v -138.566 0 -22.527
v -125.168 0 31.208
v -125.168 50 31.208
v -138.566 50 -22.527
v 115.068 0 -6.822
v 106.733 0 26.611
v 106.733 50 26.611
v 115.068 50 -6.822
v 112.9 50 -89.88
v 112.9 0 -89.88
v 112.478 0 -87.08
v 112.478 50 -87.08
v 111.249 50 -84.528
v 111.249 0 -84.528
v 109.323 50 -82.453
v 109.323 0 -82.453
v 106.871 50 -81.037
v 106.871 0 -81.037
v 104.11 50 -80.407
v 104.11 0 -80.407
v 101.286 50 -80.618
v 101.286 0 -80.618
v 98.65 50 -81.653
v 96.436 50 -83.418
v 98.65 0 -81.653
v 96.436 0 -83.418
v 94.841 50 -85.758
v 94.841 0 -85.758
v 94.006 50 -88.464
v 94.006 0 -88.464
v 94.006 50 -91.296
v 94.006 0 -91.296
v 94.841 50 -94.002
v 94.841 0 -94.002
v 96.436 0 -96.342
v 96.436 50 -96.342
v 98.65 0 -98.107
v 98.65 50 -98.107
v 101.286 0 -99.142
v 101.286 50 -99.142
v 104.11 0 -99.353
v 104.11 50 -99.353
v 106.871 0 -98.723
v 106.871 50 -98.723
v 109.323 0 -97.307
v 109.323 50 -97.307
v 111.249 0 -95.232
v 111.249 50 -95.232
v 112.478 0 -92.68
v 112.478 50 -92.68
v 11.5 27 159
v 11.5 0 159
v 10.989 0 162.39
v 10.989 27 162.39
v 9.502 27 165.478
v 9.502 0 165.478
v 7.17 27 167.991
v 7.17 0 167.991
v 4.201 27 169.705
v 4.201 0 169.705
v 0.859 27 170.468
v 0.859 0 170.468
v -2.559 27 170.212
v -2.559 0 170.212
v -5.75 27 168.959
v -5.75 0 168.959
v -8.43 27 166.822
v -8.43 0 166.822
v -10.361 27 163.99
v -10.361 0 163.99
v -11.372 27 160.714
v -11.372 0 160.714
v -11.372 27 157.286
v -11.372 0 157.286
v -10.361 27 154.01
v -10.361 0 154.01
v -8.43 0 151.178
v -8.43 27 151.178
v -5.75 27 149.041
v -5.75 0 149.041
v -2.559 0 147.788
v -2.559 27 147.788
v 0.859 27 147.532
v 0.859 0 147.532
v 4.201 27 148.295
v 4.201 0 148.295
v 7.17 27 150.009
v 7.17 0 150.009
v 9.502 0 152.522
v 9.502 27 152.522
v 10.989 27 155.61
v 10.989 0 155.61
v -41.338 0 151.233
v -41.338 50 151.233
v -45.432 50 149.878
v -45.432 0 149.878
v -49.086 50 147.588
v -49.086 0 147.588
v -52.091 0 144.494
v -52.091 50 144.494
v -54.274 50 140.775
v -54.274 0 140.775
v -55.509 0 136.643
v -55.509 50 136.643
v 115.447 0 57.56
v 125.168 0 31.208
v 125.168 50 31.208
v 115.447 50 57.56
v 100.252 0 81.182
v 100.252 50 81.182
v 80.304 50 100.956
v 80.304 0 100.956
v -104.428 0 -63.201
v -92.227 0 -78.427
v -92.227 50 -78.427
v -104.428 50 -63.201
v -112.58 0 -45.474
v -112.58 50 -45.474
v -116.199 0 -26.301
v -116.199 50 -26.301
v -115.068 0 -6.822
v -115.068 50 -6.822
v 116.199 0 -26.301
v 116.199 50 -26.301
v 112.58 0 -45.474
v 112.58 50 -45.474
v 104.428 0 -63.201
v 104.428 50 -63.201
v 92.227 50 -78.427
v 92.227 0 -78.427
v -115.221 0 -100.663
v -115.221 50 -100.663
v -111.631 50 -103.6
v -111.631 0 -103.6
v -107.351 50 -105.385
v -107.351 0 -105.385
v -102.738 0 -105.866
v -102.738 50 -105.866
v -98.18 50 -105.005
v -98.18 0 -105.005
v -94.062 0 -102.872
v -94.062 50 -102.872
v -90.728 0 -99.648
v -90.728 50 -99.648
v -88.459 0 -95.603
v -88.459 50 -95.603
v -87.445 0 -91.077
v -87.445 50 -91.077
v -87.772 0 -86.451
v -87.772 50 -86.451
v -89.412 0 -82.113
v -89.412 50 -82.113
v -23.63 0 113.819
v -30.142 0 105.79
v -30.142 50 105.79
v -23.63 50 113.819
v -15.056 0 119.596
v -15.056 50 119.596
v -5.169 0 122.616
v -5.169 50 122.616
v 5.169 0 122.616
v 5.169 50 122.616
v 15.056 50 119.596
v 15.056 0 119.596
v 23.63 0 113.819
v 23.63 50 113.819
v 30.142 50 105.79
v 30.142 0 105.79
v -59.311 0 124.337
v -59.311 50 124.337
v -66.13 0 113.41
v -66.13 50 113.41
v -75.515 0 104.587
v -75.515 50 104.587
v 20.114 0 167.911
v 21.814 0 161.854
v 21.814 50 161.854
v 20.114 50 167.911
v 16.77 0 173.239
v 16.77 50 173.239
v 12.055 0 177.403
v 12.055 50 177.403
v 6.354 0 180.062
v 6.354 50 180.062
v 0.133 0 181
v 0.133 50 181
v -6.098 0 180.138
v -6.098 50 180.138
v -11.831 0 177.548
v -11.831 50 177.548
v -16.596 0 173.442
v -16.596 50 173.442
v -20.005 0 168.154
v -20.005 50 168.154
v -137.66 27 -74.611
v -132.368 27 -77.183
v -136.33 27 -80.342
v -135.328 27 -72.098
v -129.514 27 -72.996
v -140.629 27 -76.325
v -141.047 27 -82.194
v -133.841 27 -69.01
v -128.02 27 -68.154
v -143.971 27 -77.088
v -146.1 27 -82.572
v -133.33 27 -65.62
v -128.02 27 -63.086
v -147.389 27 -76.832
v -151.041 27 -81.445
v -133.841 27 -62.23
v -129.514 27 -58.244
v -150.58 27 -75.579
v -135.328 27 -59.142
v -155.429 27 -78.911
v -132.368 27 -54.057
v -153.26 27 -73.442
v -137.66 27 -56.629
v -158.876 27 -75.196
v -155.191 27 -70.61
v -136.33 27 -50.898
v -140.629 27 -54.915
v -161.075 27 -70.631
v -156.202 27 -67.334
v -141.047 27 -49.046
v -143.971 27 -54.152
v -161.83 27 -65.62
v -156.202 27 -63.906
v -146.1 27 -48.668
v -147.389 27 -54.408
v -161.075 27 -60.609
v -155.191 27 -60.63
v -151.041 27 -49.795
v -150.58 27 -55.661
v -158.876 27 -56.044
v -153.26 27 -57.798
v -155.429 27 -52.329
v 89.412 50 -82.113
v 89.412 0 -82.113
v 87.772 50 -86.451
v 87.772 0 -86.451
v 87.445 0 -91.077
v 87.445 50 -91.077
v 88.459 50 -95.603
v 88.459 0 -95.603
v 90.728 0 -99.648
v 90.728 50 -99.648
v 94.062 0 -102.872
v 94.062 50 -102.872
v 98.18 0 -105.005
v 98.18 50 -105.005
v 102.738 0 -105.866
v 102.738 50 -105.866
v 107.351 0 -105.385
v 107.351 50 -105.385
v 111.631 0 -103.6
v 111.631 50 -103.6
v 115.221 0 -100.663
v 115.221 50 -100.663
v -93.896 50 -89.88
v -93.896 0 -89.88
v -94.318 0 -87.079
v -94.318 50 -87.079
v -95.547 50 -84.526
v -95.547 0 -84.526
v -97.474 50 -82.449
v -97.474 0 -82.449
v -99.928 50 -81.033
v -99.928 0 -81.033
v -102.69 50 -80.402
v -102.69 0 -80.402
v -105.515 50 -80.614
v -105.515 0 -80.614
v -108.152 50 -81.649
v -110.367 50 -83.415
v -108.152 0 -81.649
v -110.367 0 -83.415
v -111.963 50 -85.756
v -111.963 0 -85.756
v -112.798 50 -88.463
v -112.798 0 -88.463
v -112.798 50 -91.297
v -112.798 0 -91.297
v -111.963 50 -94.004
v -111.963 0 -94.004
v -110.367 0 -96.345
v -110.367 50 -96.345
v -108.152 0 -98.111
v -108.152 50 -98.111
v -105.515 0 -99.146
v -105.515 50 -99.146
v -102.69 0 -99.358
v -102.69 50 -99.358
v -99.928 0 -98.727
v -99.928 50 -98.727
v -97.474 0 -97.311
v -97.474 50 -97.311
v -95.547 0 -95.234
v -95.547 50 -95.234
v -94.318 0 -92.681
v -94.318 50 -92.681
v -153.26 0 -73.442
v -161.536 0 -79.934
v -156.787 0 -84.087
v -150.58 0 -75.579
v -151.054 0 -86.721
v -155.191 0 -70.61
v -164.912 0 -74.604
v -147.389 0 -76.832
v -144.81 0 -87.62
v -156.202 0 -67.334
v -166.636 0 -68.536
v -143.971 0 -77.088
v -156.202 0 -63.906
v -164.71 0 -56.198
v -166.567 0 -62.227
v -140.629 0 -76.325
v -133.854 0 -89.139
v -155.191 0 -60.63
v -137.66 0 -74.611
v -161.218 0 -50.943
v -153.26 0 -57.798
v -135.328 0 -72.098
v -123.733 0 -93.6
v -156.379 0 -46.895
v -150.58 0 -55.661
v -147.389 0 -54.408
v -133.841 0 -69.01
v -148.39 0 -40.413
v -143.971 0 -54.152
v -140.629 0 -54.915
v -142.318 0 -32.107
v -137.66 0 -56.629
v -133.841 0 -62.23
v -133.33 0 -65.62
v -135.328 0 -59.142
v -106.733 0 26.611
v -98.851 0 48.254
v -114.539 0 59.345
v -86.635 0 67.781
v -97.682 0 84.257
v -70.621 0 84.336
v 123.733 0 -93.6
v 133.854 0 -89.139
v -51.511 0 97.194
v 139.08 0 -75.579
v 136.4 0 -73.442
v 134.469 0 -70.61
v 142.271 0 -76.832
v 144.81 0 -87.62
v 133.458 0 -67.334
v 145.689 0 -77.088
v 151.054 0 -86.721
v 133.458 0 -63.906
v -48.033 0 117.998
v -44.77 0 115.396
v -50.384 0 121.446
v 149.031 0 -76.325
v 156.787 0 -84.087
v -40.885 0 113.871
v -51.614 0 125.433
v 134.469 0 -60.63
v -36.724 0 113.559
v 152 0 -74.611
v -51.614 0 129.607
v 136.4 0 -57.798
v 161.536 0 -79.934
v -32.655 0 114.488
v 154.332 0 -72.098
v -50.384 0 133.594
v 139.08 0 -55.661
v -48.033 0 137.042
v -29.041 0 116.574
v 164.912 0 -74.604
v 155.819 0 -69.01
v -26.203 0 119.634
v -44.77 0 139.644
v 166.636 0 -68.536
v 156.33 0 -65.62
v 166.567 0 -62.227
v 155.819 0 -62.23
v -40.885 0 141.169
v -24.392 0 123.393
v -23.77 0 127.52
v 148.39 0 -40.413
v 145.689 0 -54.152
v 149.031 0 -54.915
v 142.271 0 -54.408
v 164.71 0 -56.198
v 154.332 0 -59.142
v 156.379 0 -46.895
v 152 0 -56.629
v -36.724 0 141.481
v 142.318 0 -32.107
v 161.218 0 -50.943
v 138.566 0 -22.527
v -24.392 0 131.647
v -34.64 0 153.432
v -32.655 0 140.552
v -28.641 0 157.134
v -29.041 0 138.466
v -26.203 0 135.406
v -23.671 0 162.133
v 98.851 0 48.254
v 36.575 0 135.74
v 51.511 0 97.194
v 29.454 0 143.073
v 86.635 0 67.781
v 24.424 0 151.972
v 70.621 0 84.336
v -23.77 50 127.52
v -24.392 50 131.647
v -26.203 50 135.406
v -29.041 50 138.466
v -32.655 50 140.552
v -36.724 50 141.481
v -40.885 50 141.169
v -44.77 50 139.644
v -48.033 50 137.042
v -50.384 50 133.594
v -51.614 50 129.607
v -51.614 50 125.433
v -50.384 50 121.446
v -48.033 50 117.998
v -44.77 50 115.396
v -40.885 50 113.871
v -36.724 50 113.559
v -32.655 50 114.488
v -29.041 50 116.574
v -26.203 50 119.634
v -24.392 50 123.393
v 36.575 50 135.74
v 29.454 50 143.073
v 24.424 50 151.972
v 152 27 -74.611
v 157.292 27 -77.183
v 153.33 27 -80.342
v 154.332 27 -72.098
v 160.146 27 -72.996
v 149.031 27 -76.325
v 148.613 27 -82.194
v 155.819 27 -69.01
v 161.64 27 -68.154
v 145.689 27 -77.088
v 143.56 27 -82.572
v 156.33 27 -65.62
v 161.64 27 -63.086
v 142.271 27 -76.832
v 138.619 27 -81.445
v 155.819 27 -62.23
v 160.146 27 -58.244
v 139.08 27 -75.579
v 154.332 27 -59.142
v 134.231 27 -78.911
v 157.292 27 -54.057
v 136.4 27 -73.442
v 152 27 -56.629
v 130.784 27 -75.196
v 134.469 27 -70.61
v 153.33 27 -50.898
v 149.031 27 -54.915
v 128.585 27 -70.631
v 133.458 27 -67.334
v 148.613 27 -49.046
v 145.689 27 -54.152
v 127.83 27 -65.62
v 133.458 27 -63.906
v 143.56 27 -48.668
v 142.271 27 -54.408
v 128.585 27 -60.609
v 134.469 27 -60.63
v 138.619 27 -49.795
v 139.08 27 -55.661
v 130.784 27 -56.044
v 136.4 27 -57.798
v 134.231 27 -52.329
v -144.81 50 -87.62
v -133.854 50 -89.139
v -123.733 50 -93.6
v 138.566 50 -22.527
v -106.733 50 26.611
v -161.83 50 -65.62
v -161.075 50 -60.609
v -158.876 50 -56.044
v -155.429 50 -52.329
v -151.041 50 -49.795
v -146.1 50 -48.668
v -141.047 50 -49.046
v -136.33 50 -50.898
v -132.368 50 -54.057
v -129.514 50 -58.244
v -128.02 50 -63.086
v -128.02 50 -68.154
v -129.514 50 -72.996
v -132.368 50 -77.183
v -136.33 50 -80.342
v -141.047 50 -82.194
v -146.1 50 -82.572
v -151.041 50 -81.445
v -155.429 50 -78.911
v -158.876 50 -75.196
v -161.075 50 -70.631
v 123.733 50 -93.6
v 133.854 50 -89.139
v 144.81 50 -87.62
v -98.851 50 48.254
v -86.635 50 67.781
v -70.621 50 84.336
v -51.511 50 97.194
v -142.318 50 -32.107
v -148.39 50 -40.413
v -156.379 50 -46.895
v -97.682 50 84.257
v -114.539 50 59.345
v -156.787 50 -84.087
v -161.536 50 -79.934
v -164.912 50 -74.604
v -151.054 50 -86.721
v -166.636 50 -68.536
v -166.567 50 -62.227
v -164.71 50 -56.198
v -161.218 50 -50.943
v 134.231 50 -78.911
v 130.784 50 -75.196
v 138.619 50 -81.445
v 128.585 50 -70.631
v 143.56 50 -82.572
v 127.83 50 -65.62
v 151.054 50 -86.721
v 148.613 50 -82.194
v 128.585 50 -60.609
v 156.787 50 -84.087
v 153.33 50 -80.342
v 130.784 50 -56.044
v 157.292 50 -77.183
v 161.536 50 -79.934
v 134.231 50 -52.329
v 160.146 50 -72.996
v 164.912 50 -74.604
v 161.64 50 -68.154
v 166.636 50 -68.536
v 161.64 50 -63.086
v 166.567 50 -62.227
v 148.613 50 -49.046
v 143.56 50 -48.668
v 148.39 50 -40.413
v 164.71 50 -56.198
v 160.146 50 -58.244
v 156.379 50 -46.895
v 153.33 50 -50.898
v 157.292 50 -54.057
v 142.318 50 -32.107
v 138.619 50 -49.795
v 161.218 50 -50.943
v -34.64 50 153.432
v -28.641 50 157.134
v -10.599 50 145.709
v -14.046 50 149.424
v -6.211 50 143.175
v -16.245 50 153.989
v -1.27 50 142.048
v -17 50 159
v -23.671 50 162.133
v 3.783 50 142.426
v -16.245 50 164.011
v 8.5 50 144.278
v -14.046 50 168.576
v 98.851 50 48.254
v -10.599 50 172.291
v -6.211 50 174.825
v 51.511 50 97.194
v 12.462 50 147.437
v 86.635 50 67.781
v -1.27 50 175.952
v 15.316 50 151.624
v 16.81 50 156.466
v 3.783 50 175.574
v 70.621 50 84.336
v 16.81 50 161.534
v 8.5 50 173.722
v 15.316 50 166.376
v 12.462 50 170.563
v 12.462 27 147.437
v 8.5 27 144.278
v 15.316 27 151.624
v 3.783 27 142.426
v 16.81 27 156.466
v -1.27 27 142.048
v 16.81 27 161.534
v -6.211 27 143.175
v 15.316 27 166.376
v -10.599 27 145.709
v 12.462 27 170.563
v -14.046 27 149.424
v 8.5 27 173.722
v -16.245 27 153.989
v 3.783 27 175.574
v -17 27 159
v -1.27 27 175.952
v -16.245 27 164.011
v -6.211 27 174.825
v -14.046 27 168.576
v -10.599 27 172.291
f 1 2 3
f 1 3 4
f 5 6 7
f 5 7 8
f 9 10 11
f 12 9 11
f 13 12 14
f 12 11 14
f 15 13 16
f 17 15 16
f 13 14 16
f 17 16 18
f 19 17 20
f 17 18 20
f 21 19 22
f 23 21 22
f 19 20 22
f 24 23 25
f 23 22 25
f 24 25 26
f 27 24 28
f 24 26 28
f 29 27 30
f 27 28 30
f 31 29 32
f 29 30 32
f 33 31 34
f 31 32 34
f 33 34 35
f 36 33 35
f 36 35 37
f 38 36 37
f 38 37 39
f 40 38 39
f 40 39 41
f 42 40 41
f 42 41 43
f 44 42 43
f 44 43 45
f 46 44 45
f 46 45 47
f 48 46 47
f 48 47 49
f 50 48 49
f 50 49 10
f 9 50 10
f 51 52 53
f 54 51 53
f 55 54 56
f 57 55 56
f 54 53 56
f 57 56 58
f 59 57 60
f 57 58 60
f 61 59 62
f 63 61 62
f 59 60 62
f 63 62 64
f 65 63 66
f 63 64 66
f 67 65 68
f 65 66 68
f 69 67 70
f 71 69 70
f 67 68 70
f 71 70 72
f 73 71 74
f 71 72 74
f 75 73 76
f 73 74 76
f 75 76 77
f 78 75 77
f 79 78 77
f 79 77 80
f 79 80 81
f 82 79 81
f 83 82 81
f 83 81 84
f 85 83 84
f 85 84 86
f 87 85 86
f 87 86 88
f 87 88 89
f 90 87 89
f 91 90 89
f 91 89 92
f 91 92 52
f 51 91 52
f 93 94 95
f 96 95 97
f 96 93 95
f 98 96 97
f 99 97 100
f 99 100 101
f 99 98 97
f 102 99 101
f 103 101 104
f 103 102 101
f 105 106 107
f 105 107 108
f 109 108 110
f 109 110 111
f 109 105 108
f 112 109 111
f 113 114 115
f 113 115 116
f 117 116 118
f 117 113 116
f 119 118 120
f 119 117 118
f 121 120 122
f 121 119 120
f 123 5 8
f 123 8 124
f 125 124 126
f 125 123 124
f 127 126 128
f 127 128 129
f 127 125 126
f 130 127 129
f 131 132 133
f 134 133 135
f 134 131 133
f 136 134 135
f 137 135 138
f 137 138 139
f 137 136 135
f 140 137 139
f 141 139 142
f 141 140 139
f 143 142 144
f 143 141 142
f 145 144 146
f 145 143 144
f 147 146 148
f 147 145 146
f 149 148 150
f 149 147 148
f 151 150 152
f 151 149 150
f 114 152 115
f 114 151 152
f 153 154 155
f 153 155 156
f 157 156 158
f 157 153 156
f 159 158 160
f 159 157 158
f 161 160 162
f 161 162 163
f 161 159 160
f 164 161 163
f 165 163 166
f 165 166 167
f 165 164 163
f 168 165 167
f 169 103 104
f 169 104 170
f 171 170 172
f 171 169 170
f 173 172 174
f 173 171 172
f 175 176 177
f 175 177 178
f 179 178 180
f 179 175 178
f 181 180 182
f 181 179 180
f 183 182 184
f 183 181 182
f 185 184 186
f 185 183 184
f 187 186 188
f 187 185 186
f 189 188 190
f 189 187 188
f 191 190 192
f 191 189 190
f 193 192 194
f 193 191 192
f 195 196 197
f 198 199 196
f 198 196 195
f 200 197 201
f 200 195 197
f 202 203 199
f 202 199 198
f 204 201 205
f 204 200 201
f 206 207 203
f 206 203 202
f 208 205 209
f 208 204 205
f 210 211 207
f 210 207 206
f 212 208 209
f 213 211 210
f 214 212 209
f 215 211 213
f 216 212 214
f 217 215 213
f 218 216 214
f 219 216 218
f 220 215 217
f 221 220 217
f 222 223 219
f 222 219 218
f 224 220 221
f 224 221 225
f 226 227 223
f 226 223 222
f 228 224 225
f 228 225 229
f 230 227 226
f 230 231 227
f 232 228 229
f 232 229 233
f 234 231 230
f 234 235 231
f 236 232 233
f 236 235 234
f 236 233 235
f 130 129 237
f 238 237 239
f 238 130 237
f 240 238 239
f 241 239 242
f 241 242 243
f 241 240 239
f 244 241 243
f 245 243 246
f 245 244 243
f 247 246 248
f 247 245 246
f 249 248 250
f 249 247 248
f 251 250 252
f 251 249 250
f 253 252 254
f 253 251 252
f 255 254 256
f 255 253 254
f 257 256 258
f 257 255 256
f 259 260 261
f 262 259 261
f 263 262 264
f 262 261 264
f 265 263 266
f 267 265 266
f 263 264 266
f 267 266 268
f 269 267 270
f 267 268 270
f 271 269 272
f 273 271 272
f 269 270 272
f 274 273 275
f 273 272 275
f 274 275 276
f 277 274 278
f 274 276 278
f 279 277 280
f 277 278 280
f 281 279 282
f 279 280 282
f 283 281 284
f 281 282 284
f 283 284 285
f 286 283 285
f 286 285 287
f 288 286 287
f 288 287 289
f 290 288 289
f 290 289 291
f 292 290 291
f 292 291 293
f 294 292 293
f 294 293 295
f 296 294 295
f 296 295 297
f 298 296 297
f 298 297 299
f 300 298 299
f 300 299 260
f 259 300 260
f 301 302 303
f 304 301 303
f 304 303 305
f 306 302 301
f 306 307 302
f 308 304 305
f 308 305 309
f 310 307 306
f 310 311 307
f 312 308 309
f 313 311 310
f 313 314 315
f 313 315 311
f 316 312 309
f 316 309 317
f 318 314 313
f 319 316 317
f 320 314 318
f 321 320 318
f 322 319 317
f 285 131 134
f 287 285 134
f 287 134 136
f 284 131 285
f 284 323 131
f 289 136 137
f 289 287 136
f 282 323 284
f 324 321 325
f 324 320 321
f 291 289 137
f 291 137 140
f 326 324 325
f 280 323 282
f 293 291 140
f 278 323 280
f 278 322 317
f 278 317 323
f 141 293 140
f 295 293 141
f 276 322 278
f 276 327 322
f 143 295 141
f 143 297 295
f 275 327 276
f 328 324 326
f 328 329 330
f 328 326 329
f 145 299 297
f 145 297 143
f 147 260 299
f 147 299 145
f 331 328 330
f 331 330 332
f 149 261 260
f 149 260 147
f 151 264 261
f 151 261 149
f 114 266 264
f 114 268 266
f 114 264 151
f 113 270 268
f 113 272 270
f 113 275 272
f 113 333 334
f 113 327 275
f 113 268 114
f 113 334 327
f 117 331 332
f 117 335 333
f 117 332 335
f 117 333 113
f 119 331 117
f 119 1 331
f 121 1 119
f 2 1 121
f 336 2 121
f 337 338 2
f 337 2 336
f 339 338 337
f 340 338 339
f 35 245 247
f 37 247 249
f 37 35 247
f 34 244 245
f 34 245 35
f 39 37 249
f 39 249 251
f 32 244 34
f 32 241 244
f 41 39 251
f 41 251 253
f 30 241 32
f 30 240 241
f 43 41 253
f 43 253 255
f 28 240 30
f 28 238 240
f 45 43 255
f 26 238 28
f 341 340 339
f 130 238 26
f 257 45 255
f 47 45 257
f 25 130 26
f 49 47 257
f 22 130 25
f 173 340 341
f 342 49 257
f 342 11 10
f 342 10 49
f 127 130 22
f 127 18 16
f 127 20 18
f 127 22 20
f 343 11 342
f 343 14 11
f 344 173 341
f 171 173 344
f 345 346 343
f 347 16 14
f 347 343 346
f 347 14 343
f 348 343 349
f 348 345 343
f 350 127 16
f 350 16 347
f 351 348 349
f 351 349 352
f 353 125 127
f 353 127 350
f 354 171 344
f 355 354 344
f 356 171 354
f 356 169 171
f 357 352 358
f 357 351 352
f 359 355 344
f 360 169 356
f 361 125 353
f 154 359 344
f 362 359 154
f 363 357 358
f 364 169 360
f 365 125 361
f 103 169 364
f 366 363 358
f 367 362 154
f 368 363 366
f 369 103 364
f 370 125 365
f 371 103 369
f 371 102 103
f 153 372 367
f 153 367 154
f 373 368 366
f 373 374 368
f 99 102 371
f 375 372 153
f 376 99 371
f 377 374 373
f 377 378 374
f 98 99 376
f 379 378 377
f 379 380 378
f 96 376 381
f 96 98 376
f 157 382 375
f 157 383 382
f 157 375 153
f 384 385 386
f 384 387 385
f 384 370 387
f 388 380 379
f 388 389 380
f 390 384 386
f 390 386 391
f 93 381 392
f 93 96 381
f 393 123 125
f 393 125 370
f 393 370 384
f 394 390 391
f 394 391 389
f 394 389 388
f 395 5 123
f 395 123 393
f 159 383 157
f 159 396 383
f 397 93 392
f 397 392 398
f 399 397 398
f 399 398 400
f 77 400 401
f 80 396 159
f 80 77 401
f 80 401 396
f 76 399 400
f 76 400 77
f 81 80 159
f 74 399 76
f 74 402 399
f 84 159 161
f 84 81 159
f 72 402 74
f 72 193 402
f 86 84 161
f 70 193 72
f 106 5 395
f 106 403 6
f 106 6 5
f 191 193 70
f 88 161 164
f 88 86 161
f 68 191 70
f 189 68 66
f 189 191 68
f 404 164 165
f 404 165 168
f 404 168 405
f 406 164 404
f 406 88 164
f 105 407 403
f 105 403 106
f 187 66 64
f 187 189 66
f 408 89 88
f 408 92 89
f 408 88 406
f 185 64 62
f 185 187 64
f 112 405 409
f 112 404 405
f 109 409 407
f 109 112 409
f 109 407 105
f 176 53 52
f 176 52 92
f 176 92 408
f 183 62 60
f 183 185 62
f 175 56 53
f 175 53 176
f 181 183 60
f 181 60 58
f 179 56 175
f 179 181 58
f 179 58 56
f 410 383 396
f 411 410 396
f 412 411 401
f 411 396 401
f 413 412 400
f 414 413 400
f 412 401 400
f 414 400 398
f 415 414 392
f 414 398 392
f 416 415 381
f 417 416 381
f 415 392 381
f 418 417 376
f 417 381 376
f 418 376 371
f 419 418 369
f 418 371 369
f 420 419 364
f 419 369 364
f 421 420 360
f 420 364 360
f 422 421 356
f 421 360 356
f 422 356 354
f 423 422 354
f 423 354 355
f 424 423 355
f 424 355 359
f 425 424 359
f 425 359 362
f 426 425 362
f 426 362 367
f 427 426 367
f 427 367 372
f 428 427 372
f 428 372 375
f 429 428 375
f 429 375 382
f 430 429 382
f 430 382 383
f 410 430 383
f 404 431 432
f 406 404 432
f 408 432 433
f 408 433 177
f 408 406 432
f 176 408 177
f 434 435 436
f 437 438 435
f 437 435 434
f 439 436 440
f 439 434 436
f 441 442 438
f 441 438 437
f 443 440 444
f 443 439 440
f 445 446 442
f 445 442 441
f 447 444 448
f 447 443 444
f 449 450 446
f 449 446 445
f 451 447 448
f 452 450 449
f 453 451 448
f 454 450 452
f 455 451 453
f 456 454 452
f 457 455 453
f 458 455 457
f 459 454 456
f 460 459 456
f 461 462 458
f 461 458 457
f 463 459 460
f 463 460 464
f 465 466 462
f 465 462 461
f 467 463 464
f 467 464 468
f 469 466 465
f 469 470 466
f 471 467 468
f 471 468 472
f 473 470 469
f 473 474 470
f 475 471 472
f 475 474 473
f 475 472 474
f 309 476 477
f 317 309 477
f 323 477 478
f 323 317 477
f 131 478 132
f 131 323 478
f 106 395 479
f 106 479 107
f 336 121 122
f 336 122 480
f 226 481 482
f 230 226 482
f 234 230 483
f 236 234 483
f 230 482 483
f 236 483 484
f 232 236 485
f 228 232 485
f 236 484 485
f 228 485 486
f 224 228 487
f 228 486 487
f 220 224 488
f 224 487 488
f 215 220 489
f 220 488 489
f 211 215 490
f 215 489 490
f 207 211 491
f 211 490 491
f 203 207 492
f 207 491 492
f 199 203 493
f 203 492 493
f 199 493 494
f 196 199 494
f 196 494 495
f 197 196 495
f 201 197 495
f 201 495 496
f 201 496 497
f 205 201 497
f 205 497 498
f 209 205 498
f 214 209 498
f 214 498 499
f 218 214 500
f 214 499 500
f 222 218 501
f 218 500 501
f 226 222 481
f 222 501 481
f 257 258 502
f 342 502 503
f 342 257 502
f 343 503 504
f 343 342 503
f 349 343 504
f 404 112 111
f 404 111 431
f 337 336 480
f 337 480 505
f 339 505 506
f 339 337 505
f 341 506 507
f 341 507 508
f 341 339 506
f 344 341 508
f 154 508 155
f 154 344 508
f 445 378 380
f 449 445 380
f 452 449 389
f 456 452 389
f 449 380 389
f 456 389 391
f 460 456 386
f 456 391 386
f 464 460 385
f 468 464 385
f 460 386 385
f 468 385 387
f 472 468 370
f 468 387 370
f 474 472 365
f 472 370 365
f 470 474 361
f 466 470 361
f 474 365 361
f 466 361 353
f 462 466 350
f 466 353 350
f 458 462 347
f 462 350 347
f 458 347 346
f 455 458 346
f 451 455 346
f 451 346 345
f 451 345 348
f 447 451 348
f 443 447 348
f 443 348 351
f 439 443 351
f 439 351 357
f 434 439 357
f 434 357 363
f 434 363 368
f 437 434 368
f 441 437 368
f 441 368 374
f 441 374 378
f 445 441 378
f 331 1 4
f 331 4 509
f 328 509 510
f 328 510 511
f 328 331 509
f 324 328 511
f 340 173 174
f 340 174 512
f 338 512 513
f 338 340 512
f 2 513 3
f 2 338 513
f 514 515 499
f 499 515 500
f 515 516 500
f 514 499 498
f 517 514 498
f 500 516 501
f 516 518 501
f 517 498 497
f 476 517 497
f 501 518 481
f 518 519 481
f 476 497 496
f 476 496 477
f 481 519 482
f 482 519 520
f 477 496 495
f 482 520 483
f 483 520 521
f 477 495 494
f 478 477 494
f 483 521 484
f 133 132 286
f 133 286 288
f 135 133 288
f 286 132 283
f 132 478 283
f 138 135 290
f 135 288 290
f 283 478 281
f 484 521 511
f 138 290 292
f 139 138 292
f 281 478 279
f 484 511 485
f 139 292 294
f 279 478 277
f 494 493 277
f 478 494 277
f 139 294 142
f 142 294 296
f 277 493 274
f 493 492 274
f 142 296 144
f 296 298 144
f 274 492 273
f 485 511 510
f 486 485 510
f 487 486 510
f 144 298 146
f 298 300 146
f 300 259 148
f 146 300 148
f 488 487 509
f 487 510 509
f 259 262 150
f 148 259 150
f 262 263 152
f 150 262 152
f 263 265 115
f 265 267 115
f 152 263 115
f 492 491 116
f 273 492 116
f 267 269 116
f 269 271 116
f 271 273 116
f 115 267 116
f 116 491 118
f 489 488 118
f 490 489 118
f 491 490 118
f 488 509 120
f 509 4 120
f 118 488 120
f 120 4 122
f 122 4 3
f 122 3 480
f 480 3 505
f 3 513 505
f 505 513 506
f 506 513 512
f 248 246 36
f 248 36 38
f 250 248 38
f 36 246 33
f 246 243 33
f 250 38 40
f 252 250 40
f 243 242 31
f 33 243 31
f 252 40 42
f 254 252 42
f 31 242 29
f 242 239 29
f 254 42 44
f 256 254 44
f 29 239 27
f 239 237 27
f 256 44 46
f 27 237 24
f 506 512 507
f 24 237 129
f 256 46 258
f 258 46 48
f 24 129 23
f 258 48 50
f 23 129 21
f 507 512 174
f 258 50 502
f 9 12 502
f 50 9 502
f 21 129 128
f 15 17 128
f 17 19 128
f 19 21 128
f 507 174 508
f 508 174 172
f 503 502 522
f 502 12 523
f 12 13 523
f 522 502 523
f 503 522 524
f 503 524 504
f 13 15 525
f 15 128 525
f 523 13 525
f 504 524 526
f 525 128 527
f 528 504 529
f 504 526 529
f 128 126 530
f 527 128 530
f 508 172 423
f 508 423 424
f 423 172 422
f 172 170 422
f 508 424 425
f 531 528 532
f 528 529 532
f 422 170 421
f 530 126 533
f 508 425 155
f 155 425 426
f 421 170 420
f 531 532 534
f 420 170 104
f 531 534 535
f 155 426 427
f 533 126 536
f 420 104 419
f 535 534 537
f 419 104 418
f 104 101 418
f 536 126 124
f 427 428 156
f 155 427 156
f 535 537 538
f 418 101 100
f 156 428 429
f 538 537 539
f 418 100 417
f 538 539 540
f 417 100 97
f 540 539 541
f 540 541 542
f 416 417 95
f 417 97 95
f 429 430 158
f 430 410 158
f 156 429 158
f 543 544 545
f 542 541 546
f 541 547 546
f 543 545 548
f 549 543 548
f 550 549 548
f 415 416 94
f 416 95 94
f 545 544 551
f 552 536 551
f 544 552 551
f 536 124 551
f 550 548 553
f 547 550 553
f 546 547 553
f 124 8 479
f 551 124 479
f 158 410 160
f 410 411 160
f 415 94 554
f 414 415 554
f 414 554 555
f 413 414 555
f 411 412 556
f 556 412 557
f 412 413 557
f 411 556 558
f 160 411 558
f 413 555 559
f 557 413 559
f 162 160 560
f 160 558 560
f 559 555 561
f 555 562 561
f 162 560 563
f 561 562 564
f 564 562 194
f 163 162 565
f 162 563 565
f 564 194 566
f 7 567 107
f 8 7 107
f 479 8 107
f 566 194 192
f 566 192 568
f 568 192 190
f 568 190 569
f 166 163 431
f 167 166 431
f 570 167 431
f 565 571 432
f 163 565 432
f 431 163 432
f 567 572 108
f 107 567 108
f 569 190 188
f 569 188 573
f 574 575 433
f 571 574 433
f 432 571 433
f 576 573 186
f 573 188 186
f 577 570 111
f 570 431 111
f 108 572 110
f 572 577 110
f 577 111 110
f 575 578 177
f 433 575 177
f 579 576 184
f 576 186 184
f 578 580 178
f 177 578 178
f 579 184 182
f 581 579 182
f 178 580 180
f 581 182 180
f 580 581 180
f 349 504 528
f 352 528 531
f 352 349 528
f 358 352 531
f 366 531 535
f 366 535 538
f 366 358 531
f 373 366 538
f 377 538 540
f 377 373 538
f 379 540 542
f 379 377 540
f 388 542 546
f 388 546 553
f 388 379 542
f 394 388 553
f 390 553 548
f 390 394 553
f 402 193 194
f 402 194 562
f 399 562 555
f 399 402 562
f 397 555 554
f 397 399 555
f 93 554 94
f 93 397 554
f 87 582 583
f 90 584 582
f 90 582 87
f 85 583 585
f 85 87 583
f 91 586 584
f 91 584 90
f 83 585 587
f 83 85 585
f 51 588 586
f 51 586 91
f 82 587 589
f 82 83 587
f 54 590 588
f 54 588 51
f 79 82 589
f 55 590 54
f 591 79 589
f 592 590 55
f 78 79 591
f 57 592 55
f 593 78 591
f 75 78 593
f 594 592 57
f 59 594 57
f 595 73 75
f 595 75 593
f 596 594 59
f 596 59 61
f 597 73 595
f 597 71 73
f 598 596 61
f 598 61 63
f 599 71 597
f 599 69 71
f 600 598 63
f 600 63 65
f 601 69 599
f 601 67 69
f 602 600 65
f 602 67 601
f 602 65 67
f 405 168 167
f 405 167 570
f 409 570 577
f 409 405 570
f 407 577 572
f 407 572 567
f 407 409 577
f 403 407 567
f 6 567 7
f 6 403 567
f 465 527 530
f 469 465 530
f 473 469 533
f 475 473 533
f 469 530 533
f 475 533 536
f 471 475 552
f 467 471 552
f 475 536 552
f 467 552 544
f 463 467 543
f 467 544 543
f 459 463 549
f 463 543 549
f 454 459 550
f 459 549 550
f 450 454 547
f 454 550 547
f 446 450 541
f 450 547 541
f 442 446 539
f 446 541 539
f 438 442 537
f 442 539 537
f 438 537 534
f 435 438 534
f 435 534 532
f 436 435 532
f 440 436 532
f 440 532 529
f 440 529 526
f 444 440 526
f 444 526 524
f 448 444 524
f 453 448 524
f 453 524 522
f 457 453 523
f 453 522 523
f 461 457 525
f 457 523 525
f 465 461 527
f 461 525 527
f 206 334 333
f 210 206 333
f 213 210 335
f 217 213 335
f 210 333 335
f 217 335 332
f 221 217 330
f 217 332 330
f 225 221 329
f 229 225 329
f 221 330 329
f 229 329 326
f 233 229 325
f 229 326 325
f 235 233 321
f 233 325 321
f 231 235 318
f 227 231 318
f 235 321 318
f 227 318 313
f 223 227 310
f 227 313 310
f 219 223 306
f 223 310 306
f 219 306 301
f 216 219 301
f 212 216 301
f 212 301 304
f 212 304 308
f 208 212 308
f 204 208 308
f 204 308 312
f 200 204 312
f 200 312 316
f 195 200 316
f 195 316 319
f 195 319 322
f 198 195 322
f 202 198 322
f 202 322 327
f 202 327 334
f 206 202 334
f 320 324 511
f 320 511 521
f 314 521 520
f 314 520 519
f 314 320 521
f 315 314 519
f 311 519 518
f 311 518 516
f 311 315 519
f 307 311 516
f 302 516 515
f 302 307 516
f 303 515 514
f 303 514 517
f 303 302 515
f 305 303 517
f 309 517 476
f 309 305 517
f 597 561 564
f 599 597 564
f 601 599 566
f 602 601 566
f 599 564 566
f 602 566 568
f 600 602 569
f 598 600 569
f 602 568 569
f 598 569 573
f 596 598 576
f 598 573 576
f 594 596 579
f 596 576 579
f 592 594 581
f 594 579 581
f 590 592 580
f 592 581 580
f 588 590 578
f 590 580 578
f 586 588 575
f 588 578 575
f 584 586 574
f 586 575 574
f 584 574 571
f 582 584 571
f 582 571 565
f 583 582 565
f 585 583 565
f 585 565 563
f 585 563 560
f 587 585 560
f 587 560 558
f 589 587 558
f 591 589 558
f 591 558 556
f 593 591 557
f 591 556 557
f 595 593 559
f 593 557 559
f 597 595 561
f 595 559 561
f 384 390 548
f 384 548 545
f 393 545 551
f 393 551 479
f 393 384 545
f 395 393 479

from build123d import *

# Parameters (mm, degrees)
F1_DEPTH = 50
F2_R     = 11.5
F3_DEPTH = 64
F4_R     = 14
F5_DEPTH = 62
F6_R     = 9.504259
F6_R_2   = 9.5
F7_DEPTH = 58
F8_R     = 17
F9_DEPTH = 23


with BuildPart() as f1:
    # F0 (on Front) → F1 (new body)
    with BuildSketch(Plane.XZ):
        with BuildLine():
            ThreePointArc((-106.73253, 26.611409), (-79.062913, 76.47912), (-30.141732, 105.789773))
            ThreePointArc((-30.141732, 105.789773), (0, 123), (30.141732, 105.789773))
            ThreePointArc((30.141732, 105.789773), (79.062913, 76.47912), (106.73253, 26.611409))
            Line((106.73253, 26.611409), (115.068493, -6.822315))
            ThreePointArc((115.068493, -6.822315), (112.580369, -45.473999), (92.227353, -78.426968))
            ThreePointArc((92.227353, -78.426968), (92.277337, -101.381582), (115.220751, -100.66285))
            ThreePointArc((115.220751, -100.66285), (128.638477, -91.018209), (144.809642, -87.619991))
            ThreePointArc((144.809642, -87.619991), (165.992581, -71.632085), (156.379154, -46.895229))
            ThreePointArc((156.379154, -46.895229), (145.085673, -36.45592), (138.565787, -22.527067))
            Line((138.565787, -22.527067), (125.168149, 31.207925))
            ThreePointArc((125.168149, 31.207925), (108.494033, 69.785707), (80.304388, 100.956452))
            Line((80.304388, 100.956452), (36.575319, 135.740125))
            ThreePointArc((36.575319, 135.740125), (26.653961, 147.361151), (21.814031, 161.854483))
            ThreePointArc((21.814031, 161.854483), (3.277246, 180.754532), (-20.004938, 168.154367))
            ThreePointArc((-20.004938, 168.154367), (-28.641021, 157.133884), (-41.3379, 151.232848))
            ThreePointArc((-41.3379, 151.232848), (-50.681665, 146.131487), (-55.509144, 136.643322))
            ThreePointArc((-55.509144, 136.643322), (-62.367303, 118.652566), (-75.515118, 104.587126))
            ThreePointArc((-75.515118, 104.587126), (-106.838992, 72.294051), (-125.168149, 31.207925))
            Line((-125.168149, 31.207925), (-138.565787, -22.527067))
            ThreePointArc((-138.565787, -22.527067), (-145.085673, -36.45592), (-156.379154, -46.895229))
            ThreePointArc((-156.379154, -46.895229), (-165.992581, -71.632085), (-144.809642, -87.619991))
            ThreePointArc((-144.809642, -87.619991), (-128.638477, -91.018209), (-115.220751, -100.66285))
            ThreePointArc((-115.220751, -100.66285), (-92.277337, -101.381582), (-92.227353, -78.426968))
            ThreePointArc((-92.227353, -78.426968), (-112.580369, -45.473999), (-115.068493, -6.822315))
            Line((-115.068493, -6.822315), (-106.73253, 26.611409))
        make_face()
    extrude(amount=-F1_DEPTH)

    # F2 (on Front) → F3 (cut)
    with BuildSketch(Plane.XZ):
        with Locations((0, 159)):
            Circle(F2_R)
        with Locations((144.83, -65.62)):
            Circle(F2_R)
        with Locations((-144.83, -65.62)):
            Circle(F2_R)
    extrude(amount=-F3_DEPTH, mode=Mode.SUBTRACT)

    # F4 (on Front) → F5 (cut)
    with BuildSketch(Plane.XZ):
        with Locations((-37.77, 127.52)):
            Circle(F4_R)
    extrude(amount=-F5_DEPTH, mode=Mode.SUBTRACT)

    # F6 (on Front) → F7 (cut)
    with BuildSketch(Plane.XZ):
        with Locations((-103.4, -89.88)):
            Circle(F6_R)
        with Locations((103.4, -89.88)):
            Circle(F6_R_2)
    extrude(amount=-F7_DEPTH, mode=Mode.SUBTRACT)

    # F8 (on face) → F9 (cut)
    with BuildSketch(Plane(origin=(0, 50, 0), x_dir=(-1, 0, 0), z_dir=(0, 1, 0))):
        with Locations((-144.83, -65.62)):
            Circle(F8_R)
        with Locations((144.83, -65.62)):
            Circle(F8_R)
        with Locations((0, 159)):
            Circle(F8_R)
    extrude(amount=-F9_DEPTH, mode=Mode.SUBTRACT)


solid = f1.part
